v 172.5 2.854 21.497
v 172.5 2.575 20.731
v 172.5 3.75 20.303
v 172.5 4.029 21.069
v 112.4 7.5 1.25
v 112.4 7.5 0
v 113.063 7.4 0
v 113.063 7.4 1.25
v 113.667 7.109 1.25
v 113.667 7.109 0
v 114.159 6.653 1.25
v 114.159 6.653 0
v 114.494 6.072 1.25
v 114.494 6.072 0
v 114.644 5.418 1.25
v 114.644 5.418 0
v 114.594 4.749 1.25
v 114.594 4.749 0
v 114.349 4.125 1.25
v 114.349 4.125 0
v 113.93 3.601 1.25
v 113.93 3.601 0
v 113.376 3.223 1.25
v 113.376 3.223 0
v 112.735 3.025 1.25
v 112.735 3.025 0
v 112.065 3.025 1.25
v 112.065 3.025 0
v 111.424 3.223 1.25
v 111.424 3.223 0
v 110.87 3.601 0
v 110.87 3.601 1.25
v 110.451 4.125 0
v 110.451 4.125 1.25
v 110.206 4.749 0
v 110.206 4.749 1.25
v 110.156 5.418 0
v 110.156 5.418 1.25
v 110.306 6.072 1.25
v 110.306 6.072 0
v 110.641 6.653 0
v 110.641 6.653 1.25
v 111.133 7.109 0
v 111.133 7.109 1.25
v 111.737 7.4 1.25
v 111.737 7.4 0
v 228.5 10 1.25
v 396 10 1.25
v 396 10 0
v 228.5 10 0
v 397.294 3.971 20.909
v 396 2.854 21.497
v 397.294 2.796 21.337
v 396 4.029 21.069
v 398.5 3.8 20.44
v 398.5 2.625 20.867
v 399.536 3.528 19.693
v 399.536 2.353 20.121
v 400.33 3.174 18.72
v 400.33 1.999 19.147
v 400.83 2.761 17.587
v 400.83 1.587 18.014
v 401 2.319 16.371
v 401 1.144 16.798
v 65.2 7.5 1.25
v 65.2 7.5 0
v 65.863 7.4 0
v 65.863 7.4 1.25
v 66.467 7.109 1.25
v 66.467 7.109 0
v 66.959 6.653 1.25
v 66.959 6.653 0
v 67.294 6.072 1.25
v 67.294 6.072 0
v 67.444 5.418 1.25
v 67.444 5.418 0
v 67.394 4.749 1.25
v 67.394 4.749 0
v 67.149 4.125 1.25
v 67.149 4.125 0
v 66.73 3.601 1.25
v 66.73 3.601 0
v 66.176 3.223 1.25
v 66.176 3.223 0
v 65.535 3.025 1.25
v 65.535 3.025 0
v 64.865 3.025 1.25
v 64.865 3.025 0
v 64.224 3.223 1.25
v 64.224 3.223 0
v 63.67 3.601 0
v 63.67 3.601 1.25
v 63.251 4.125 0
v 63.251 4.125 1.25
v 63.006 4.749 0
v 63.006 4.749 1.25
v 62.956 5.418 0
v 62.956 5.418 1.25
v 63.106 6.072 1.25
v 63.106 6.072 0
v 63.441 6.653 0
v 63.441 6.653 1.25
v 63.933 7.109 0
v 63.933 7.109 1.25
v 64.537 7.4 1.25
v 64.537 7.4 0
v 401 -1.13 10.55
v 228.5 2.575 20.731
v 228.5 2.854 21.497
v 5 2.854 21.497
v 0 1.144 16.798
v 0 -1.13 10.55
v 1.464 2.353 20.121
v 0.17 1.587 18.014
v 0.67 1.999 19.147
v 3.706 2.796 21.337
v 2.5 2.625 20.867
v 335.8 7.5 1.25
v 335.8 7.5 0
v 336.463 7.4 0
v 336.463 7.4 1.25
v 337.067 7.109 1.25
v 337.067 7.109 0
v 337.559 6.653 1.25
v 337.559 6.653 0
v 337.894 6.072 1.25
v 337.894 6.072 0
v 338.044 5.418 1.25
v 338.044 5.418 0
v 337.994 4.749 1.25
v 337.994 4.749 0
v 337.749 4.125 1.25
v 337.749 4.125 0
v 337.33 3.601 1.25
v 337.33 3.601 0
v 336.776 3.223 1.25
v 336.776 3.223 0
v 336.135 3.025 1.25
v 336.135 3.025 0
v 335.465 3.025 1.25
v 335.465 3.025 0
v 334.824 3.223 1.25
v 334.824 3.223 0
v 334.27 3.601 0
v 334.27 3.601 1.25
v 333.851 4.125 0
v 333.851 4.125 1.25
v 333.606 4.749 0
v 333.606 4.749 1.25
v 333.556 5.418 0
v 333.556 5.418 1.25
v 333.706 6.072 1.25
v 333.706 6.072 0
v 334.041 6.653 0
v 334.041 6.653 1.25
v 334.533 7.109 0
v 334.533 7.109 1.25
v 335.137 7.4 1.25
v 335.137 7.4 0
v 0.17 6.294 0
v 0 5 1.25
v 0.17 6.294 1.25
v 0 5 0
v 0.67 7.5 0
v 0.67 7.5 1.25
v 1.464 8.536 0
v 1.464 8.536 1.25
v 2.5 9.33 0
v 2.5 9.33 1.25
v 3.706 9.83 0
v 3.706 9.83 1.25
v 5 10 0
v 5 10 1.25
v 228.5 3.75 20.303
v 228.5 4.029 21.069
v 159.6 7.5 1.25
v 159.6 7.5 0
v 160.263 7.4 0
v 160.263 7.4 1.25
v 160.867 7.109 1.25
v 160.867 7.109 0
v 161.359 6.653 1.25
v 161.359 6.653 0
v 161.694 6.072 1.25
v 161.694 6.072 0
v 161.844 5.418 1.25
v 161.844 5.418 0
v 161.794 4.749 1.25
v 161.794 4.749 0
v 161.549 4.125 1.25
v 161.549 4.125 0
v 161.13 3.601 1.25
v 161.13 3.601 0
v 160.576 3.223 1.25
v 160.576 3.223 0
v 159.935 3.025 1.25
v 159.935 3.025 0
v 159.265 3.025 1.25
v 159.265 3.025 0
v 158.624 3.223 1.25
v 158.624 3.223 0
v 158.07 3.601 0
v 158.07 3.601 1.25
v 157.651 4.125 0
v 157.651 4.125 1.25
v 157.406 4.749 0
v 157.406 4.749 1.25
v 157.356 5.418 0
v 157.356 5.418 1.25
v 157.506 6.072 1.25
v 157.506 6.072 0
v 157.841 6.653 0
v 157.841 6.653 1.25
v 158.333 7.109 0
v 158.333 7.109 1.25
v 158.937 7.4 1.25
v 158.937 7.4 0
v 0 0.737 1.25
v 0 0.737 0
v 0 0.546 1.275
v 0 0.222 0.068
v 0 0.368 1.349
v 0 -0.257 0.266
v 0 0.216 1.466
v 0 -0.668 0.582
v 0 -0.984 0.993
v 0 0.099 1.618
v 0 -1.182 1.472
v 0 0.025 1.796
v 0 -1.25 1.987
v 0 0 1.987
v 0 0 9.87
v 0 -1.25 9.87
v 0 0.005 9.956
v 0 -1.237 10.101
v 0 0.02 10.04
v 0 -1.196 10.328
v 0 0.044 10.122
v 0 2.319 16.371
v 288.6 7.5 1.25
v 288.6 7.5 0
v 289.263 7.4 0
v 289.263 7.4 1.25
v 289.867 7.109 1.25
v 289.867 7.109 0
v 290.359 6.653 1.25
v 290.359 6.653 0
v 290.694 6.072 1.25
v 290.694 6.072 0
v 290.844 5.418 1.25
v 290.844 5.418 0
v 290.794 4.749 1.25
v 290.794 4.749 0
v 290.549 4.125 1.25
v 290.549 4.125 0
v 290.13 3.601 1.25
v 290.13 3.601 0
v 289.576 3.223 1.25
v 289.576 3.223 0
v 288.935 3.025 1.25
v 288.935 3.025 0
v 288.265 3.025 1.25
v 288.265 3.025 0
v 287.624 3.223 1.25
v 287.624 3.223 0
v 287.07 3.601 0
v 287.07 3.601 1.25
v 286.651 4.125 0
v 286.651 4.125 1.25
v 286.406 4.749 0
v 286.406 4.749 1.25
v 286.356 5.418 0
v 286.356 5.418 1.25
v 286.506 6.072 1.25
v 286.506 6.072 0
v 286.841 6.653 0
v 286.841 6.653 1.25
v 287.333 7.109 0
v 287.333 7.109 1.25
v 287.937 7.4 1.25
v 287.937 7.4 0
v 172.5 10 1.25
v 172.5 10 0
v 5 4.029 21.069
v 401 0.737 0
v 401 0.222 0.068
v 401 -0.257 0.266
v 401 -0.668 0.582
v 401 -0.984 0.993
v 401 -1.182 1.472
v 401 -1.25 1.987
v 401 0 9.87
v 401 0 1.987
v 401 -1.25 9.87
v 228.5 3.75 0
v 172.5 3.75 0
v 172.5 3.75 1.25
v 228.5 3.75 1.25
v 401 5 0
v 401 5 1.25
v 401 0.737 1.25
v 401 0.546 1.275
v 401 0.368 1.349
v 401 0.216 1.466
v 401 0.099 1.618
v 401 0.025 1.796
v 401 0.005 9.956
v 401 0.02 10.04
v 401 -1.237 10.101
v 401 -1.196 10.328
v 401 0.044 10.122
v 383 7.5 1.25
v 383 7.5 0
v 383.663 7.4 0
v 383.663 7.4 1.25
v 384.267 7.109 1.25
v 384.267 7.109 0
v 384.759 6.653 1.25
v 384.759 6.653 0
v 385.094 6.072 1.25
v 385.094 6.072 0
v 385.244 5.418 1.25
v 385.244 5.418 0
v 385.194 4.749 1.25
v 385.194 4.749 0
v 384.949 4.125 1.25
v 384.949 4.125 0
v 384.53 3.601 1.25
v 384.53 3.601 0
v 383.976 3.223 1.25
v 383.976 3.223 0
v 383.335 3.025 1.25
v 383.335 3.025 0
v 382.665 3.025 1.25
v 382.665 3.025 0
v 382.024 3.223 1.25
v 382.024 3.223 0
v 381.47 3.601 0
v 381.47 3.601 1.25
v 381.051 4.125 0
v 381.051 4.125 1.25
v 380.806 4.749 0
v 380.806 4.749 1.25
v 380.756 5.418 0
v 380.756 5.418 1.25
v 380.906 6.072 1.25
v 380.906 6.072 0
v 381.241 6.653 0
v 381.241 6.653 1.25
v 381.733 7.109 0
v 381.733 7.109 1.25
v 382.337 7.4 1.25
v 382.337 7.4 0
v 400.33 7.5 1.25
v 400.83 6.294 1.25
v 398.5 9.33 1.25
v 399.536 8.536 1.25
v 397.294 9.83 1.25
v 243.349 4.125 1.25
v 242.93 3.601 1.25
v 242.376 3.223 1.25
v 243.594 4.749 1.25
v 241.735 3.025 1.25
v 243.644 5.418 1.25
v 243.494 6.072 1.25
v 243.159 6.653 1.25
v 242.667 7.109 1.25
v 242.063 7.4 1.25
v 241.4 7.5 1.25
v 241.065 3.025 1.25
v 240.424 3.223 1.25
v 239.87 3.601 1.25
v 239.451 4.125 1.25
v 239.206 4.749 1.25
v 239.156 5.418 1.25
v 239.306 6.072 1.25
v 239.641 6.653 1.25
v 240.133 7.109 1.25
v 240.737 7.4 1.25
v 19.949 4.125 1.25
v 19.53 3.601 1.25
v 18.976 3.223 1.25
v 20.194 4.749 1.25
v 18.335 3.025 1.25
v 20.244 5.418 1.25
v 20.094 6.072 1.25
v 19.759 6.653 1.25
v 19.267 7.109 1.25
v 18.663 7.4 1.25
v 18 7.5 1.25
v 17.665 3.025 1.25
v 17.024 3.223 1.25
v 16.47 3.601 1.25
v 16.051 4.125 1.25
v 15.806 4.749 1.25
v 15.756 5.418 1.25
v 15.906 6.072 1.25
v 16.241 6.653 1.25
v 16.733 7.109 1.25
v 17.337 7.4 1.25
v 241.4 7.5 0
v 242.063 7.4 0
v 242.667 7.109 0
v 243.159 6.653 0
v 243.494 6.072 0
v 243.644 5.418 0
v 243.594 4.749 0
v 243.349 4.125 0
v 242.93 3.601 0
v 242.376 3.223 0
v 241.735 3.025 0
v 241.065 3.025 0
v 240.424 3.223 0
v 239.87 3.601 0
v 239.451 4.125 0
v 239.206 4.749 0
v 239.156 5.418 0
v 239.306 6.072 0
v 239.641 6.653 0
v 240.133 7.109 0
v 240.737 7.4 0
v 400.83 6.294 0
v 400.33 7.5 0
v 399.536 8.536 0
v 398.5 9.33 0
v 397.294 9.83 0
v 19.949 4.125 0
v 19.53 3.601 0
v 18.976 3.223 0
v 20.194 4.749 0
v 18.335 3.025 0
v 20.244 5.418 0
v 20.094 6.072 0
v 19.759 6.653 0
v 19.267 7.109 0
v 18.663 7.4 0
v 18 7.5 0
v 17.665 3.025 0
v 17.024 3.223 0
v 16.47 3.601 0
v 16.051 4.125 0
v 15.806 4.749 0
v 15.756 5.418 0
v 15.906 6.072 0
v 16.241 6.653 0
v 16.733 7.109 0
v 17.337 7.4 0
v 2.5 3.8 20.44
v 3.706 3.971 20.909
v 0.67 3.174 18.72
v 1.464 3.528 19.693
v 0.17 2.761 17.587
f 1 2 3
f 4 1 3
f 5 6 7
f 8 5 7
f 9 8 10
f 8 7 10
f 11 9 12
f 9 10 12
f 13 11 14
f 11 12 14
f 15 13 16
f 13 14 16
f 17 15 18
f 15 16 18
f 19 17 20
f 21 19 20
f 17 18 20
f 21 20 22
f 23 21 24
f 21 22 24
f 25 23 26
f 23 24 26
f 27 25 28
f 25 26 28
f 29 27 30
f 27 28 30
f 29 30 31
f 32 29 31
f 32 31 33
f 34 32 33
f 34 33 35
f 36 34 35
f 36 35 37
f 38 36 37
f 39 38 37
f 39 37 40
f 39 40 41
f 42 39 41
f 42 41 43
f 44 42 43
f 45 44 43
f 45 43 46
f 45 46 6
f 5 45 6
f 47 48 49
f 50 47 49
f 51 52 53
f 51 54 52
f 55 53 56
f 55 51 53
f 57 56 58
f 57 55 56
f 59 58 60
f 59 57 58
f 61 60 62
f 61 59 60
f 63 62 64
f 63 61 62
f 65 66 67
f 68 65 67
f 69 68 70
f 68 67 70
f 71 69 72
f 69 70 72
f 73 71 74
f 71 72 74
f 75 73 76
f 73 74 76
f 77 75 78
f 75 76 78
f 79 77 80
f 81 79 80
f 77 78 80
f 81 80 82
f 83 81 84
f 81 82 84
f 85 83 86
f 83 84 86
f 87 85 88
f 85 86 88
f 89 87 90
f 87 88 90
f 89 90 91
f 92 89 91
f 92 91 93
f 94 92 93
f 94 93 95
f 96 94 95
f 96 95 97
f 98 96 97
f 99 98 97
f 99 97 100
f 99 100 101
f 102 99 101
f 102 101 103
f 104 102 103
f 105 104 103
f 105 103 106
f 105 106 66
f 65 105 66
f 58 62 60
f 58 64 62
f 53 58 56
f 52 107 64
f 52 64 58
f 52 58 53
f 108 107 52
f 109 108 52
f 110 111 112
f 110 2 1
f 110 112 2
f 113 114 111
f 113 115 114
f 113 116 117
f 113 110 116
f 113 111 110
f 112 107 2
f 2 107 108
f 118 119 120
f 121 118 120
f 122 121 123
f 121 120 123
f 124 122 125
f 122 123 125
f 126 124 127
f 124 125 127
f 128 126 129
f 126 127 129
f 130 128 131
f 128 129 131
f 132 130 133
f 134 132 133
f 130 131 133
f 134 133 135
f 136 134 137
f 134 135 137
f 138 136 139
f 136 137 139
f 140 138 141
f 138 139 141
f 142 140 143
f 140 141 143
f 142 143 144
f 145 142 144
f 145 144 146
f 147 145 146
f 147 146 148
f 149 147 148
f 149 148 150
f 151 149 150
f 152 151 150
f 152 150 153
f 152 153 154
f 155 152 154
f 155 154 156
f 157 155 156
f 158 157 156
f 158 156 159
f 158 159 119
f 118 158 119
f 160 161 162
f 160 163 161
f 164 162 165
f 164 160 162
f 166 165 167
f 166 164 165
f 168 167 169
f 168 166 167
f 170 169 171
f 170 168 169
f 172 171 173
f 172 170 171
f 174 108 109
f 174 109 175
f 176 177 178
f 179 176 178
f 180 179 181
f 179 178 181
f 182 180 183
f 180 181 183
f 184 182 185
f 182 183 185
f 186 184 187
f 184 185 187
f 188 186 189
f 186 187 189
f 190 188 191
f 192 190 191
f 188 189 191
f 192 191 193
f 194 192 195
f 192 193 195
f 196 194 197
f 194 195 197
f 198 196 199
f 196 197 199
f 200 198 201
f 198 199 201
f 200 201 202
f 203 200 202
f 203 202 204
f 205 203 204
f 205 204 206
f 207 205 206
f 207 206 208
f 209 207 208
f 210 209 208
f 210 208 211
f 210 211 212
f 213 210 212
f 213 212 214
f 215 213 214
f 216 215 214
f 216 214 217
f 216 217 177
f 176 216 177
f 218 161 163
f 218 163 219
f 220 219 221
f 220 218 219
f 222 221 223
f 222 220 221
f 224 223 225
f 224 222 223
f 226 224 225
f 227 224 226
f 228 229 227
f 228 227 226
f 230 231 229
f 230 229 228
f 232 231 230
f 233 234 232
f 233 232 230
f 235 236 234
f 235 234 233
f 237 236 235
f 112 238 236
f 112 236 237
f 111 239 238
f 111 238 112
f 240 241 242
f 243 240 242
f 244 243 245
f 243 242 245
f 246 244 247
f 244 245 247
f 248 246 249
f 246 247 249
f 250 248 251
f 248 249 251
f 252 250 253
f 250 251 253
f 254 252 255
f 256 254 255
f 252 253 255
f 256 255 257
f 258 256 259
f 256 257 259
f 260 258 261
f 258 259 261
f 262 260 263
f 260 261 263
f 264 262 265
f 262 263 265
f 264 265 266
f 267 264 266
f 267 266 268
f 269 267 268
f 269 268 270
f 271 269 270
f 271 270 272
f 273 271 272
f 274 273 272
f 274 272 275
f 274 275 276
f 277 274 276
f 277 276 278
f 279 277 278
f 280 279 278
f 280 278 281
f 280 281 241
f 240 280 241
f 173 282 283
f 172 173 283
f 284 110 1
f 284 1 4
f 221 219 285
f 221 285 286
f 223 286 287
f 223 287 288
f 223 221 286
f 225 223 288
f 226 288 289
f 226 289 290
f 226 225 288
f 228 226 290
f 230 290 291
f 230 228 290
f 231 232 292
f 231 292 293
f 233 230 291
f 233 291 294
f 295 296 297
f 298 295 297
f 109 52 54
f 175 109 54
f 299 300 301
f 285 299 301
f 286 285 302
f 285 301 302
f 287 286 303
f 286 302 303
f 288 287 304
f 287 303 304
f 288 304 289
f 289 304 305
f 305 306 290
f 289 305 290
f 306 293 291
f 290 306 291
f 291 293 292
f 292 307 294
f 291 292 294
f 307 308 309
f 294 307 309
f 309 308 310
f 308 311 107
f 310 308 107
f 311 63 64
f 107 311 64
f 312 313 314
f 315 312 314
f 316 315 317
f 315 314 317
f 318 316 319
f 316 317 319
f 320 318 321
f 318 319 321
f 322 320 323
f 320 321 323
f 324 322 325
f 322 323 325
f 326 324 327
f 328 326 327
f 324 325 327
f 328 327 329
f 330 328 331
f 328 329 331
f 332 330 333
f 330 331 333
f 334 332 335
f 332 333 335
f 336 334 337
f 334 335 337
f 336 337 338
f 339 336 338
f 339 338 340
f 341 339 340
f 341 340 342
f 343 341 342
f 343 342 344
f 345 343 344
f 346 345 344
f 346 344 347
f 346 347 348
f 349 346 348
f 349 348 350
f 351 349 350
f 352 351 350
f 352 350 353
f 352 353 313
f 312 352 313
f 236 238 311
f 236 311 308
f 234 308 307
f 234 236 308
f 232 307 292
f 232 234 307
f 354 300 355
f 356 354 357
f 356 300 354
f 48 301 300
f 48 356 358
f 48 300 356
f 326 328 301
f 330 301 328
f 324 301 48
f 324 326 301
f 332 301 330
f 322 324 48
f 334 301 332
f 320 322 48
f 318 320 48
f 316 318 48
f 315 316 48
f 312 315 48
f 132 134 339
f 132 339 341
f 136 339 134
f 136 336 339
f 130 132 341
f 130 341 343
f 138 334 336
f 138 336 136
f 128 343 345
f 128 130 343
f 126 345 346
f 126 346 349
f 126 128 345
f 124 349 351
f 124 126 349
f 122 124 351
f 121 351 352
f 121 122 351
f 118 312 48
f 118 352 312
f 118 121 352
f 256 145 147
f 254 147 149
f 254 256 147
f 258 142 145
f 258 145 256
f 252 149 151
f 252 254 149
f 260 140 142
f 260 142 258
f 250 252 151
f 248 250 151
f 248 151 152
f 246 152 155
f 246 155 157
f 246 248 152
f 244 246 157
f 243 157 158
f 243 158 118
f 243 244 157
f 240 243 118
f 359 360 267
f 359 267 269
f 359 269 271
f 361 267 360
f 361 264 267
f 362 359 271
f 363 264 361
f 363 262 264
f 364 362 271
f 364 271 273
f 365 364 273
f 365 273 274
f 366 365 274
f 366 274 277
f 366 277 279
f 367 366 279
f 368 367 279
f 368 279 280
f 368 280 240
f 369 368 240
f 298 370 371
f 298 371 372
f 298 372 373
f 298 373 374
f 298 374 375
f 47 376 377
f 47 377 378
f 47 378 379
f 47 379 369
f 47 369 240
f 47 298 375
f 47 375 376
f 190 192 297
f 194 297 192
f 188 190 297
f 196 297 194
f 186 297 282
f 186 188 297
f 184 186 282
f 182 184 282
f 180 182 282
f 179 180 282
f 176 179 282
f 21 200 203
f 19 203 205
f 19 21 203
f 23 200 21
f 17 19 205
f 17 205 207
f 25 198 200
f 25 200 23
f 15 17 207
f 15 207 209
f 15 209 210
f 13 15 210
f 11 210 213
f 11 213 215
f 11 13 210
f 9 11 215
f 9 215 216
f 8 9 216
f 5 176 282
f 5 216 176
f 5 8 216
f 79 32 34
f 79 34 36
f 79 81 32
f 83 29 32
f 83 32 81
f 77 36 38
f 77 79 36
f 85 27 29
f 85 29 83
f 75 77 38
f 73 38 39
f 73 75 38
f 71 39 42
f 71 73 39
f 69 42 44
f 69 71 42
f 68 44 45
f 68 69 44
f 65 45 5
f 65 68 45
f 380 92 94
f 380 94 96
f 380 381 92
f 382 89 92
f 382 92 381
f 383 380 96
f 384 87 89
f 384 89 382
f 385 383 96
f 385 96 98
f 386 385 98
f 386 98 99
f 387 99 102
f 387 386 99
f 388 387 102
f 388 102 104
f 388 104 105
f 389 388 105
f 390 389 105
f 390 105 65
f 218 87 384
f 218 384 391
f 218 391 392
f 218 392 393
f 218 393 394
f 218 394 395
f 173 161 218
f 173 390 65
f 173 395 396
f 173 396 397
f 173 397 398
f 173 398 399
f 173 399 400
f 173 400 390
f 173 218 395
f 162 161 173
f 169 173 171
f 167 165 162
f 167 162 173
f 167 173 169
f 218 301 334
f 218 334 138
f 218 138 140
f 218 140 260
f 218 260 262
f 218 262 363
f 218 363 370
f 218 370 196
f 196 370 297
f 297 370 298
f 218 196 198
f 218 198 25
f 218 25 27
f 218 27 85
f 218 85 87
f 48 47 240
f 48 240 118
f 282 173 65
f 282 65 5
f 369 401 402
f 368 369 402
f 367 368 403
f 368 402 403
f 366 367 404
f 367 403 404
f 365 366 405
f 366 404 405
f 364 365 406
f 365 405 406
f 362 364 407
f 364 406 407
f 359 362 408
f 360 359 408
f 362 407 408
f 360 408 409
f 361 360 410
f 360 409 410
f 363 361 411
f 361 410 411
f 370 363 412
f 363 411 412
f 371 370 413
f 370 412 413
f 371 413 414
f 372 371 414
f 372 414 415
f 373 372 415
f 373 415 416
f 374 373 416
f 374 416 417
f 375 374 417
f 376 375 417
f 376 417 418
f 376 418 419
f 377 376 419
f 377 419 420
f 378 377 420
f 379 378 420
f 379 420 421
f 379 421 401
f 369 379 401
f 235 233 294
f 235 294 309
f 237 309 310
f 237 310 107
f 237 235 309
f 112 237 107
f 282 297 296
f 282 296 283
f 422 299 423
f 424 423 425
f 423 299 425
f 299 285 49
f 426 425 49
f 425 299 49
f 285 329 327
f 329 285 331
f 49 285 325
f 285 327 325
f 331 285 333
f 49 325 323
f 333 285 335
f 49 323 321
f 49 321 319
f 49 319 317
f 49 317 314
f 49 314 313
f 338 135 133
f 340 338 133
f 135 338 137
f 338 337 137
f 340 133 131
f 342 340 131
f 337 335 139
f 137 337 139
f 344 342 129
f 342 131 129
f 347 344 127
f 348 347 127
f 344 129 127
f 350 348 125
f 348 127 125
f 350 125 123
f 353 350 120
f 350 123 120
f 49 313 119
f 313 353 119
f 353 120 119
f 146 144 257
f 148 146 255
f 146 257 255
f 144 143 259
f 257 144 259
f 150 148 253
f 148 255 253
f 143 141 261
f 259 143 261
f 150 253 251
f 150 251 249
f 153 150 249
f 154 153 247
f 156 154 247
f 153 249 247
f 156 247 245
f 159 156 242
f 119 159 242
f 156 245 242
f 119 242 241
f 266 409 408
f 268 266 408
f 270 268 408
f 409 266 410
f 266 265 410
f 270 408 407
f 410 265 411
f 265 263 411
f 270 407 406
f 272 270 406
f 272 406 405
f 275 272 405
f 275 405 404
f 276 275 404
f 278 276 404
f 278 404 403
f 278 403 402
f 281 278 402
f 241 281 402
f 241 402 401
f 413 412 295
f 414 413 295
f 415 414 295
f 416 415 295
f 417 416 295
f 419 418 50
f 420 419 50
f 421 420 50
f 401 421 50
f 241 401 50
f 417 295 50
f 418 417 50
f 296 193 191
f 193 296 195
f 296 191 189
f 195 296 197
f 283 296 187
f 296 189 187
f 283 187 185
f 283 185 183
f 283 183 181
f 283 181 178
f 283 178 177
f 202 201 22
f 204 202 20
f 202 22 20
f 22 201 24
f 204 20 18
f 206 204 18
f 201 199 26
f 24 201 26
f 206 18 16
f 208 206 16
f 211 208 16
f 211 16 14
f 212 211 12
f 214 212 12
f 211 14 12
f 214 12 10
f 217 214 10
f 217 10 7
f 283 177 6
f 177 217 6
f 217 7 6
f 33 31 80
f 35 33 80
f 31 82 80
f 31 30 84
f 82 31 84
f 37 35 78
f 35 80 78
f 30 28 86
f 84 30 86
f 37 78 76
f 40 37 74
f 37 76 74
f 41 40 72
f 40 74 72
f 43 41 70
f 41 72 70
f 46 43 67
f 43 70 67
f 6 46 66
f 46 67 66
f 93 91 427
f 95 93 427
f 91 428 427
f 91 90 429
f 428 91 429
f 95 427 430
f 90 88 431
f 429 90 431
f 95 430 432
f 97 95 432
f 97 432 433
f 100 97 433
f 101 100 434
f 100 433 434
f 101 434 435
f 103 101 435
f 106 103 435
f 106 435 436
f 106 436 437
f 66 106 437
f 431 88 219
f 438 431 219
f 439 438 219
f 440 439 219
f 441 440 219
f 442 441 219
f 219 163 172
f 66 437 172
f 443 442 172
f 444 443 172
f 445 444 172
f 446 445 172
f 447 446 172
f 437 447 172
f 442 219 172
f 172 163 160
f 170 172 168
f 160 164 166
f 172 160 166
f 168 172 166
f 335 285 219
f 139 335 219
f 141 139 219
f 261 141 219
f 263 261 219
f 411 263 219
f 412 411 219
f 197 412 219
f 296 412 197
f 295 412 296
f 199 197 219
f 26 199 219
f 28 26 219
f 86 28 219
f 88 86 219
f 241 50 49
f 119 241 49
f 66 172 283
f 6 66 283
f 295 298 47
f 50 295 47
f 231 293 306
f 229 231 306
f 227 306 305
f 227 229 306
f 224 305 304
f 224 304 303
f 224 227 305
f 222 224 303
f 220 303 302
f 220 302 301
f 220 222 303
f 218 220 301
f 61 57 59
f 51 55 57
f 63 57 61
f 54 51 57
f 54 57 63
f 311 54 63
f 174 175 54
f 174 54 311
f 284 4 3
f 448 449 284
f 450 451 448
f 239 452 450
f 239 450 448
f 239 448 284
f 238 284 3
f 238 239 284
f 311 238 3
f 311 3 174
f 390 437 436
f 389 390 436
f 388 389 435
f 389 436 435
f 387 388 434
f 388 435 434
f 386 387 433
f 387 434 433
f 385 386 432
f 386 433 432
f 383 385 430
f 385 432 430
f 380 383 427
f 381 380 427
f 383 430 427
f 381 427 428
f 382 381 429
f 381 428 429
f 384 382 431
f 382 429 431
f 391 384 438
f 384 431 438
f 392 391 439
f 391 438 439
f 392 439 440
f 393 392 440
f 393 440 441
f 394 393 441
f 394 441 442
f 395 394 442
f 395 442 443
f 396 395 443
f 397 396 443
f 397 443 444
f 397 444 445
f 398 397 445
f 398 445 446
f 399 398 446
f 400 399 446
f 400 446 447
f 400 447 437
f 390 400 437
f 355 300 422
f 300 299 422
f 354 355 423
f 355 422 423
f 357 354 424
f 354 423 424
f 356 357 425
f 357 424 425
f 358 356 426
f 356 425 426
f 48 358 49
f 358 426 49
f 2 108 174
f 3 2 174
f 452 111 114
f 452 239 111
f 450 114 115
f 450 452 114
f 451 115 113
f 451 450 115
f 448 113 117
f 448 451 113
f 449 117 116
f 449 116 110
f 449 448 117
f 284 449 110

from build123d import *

# Parameters (mm, degrees)
SKETCH1_W                    = 1.25
SKETCH1_H                    = 10
BASE_FLANGE1_DEPTH           = 401
EDGE_FLANGE1_STRIP_W         = 6.4732
EDGE_FLANGE1_STRIP_H         = 1.25
EDGE_FLANGE1_STRIP_CUT_DEPTH = 401
EDGE_FLANGE1_DEPTH           = 401
EDGE_FLANGE2_STRIP_CUT_DEPTH = 401
EDGE_FLANGE2_DEPTH           = 401
CUT_EXTRUDE1_START           = 172.5
CUT_EXTRUDE1_OUTLINE_W       = 6.25
CUT_EXTRUDE1_OUTLINE_H       = 1.25
CUT_EXTRUDE1_DEPTH           = 56
SKETCH10_R                   = 2.25
CUT_EXTRUDE2_DEPTH           = 10
FILLET1_R                    = 5


# Read off the part's stored shape, not the designer's step: Cut-Extrude1
# Sheet-metal steps are written as plain solids
with BuildPart() as part:
    # Sketch1 → Base-Flange1 (new body)
    with BuildSketch(Plane(origin=(0, 0, 0), x_dir=(0, 0, -1), z_dir=(1, 0, 0))):
        with Locations((-0.625, 5)):
            Rectangle(SKETCH1_W, SKETCH1_H)
    extrude(amount=BASE_FLANGE1_DEPTH)

    # Edge-Flange1 strip (across the edge) → Edge-Flange1 strip cut (cut)
    with BuildSketch(Plane(origin=(0, 0, 1.25), x_dir=(0, 1, 0), z_dir=(1, 0, 0))):
        with Locations((-2.5, -0.625)):
            Rectangle(EDGE_FLANGE1_STRIP_W, EDGE_FLANGE1_STRIP_H)
    extrude(amount=EDGE_FLANGE1_STRIP_CUT_DEPTH, mode=Mode.SUBTRACT)

    # Edge-Flange1 section (across the edge) → Edge-Flange1 (add)
    with BuildSketch(Plane(origin=(0, 0, 1.25), x_dir=(0, 1, 0), z_dir=(1, 0, 0))):
        with BuildLine():
            Line((-1.25, 0.7366), (-1.25, 8.75))
            Line((-1.25, 8.75), (0, 8.75))
            Line((0, 8.75), (0, 0.7366))
            ThreePointArc((0, 0.7366), (0.215745145, 0.215745145), (0.7366, 0))
            Line((0.7366, 0), (0.7366, -1.25))
            ThreePointArc((0.7366, -1.25), (-0.668138332, -0.668138332), (-1.25, 0.7366))
        make_face()
    extrude(amount=EDGE_FLANGE1_DEPTH)

    # Edge-Flange2 strip (across the edge) → Edge-Flange2 strip cut (cut)
    with BuildSketch(Plane(origin=(0, 0, 10), x_dir=(0, 0.9396926207859113, -0.3420201433256607), z_dir=(1, 0, 0))):
        Polygon((-3.344158152, 5.53324351), (-1.13019336, -0.549574763), (0.044422416, -0.122049584), (-2.169542376, 5.960768689), align=None)
    extrude(amount=EDGE_FLANGE2_STRIP_CUT_DEPTH, mode=Mode.SUBTRACT)

    # Edge-Flange2 section (across the edge) → Edge-Flange2 (add)
    with BuildSketch(Plane(origin=(0, 0, 10), x_dir=(0, 0.9396926207859113, -0.3420201433256607), z_dir=(1, 0, 0))):
        with BuildLine():
            Line((-1.25, 0.129882454), (-1.25, 11.779591274))
            Line((-1.25, 11.779591274), (0, 11.779591274))
            Line((0, 11.779591274), (0, 0.129882454))
            ThreePointArc((0, 0.129882454), (0.011190609, 0.001973206), (0.044422416, -0.122049584))
            Line((0.044422416, -0.122049584), (-1.13019336, -0.549574763))
            ThreePointArc((-1.13019336, -0.549574763), (-1.219819082, -0.215087016), (-1.25, 0.129882454))
        make_face()
    extrude(amount=EDGE_FLANGE2_DEPTH)

    # Cut-Extrude1 outline → Cut-Extrude1 (cut)
    with BuildSketch(Plane.YZ.offset(CUT_EXTRUDE1_START)):
        Polygon((2.85424172, 21.496720175), (2.575384224, 20.730565502), (3.75, 20.303040323), (4.028857496, 21.069194996), align=None)
        with Locations((6.875, 0.625)):
            Rectangle(CUT_EXTRUDE1_OUTLINE_W, CUT_EXTRUDE1_OUTLINE_H)
    extrude(amount=CUT_EXTRUDE1_DEPTH, mode=Mode.SUBTRACT)

    # Sketch10 → Cut-Extrude2 (cut)
    with BuildSketch(Plane(origin=(0, 0, 0), x_dir=(-1, 0, 0), z_dir=(0, 0, -1))):
        with Locations(Location((-18, 5.25, 0), (0, 0, 90))):
            Circle(SKETCH10_R)
        with Locations(Location((-65.2, 5.25, 0), (0, 0, 90))):
            Circle(SKETCH10_R)
        with Locations(Location((-112.4, 5.25, 0), (0, 0, 90))):
            Circle(SKETCH10_R)
        with Locations(Location((-159.6, 5.25, 0), (0, 0, 90))):
            Circle(SKETCH10_R)
        with Locations(Location((-241.4, 5.25, 0), (0, 0, 90))):
            Circle(SKETCH10_R)
        with Locations(Location((-288.6, 5.25, 0), (0, 0, 90))):
            Circle(SKETCH10_R)
        with Locations(Location((-335.8, 5.25, 0), (0, 0, 90))):
            Circle(SKETCH10_R)
        with Locations(Location((-383, 5.25, 0), (0, 0, 90))):
            Circle(SKETCH10_R)
    extrude(amount=-CUT_EXTRUDE2_DEPTH, mode=Mode.SUBTRACT)

    # Fillet1
    fillet1_edges = [part.edges().sort_by_distance(p)[0] for p in [
        (401, 10, 0.625),
        (0, 10, 0.625),
        (0, 3.441549608, 21.282957586),
        (401, 3.441549608, 21.282957586),
    ]]
    fillet(fillet1_edges, radius=FILLET1_R)


solid = part.part
